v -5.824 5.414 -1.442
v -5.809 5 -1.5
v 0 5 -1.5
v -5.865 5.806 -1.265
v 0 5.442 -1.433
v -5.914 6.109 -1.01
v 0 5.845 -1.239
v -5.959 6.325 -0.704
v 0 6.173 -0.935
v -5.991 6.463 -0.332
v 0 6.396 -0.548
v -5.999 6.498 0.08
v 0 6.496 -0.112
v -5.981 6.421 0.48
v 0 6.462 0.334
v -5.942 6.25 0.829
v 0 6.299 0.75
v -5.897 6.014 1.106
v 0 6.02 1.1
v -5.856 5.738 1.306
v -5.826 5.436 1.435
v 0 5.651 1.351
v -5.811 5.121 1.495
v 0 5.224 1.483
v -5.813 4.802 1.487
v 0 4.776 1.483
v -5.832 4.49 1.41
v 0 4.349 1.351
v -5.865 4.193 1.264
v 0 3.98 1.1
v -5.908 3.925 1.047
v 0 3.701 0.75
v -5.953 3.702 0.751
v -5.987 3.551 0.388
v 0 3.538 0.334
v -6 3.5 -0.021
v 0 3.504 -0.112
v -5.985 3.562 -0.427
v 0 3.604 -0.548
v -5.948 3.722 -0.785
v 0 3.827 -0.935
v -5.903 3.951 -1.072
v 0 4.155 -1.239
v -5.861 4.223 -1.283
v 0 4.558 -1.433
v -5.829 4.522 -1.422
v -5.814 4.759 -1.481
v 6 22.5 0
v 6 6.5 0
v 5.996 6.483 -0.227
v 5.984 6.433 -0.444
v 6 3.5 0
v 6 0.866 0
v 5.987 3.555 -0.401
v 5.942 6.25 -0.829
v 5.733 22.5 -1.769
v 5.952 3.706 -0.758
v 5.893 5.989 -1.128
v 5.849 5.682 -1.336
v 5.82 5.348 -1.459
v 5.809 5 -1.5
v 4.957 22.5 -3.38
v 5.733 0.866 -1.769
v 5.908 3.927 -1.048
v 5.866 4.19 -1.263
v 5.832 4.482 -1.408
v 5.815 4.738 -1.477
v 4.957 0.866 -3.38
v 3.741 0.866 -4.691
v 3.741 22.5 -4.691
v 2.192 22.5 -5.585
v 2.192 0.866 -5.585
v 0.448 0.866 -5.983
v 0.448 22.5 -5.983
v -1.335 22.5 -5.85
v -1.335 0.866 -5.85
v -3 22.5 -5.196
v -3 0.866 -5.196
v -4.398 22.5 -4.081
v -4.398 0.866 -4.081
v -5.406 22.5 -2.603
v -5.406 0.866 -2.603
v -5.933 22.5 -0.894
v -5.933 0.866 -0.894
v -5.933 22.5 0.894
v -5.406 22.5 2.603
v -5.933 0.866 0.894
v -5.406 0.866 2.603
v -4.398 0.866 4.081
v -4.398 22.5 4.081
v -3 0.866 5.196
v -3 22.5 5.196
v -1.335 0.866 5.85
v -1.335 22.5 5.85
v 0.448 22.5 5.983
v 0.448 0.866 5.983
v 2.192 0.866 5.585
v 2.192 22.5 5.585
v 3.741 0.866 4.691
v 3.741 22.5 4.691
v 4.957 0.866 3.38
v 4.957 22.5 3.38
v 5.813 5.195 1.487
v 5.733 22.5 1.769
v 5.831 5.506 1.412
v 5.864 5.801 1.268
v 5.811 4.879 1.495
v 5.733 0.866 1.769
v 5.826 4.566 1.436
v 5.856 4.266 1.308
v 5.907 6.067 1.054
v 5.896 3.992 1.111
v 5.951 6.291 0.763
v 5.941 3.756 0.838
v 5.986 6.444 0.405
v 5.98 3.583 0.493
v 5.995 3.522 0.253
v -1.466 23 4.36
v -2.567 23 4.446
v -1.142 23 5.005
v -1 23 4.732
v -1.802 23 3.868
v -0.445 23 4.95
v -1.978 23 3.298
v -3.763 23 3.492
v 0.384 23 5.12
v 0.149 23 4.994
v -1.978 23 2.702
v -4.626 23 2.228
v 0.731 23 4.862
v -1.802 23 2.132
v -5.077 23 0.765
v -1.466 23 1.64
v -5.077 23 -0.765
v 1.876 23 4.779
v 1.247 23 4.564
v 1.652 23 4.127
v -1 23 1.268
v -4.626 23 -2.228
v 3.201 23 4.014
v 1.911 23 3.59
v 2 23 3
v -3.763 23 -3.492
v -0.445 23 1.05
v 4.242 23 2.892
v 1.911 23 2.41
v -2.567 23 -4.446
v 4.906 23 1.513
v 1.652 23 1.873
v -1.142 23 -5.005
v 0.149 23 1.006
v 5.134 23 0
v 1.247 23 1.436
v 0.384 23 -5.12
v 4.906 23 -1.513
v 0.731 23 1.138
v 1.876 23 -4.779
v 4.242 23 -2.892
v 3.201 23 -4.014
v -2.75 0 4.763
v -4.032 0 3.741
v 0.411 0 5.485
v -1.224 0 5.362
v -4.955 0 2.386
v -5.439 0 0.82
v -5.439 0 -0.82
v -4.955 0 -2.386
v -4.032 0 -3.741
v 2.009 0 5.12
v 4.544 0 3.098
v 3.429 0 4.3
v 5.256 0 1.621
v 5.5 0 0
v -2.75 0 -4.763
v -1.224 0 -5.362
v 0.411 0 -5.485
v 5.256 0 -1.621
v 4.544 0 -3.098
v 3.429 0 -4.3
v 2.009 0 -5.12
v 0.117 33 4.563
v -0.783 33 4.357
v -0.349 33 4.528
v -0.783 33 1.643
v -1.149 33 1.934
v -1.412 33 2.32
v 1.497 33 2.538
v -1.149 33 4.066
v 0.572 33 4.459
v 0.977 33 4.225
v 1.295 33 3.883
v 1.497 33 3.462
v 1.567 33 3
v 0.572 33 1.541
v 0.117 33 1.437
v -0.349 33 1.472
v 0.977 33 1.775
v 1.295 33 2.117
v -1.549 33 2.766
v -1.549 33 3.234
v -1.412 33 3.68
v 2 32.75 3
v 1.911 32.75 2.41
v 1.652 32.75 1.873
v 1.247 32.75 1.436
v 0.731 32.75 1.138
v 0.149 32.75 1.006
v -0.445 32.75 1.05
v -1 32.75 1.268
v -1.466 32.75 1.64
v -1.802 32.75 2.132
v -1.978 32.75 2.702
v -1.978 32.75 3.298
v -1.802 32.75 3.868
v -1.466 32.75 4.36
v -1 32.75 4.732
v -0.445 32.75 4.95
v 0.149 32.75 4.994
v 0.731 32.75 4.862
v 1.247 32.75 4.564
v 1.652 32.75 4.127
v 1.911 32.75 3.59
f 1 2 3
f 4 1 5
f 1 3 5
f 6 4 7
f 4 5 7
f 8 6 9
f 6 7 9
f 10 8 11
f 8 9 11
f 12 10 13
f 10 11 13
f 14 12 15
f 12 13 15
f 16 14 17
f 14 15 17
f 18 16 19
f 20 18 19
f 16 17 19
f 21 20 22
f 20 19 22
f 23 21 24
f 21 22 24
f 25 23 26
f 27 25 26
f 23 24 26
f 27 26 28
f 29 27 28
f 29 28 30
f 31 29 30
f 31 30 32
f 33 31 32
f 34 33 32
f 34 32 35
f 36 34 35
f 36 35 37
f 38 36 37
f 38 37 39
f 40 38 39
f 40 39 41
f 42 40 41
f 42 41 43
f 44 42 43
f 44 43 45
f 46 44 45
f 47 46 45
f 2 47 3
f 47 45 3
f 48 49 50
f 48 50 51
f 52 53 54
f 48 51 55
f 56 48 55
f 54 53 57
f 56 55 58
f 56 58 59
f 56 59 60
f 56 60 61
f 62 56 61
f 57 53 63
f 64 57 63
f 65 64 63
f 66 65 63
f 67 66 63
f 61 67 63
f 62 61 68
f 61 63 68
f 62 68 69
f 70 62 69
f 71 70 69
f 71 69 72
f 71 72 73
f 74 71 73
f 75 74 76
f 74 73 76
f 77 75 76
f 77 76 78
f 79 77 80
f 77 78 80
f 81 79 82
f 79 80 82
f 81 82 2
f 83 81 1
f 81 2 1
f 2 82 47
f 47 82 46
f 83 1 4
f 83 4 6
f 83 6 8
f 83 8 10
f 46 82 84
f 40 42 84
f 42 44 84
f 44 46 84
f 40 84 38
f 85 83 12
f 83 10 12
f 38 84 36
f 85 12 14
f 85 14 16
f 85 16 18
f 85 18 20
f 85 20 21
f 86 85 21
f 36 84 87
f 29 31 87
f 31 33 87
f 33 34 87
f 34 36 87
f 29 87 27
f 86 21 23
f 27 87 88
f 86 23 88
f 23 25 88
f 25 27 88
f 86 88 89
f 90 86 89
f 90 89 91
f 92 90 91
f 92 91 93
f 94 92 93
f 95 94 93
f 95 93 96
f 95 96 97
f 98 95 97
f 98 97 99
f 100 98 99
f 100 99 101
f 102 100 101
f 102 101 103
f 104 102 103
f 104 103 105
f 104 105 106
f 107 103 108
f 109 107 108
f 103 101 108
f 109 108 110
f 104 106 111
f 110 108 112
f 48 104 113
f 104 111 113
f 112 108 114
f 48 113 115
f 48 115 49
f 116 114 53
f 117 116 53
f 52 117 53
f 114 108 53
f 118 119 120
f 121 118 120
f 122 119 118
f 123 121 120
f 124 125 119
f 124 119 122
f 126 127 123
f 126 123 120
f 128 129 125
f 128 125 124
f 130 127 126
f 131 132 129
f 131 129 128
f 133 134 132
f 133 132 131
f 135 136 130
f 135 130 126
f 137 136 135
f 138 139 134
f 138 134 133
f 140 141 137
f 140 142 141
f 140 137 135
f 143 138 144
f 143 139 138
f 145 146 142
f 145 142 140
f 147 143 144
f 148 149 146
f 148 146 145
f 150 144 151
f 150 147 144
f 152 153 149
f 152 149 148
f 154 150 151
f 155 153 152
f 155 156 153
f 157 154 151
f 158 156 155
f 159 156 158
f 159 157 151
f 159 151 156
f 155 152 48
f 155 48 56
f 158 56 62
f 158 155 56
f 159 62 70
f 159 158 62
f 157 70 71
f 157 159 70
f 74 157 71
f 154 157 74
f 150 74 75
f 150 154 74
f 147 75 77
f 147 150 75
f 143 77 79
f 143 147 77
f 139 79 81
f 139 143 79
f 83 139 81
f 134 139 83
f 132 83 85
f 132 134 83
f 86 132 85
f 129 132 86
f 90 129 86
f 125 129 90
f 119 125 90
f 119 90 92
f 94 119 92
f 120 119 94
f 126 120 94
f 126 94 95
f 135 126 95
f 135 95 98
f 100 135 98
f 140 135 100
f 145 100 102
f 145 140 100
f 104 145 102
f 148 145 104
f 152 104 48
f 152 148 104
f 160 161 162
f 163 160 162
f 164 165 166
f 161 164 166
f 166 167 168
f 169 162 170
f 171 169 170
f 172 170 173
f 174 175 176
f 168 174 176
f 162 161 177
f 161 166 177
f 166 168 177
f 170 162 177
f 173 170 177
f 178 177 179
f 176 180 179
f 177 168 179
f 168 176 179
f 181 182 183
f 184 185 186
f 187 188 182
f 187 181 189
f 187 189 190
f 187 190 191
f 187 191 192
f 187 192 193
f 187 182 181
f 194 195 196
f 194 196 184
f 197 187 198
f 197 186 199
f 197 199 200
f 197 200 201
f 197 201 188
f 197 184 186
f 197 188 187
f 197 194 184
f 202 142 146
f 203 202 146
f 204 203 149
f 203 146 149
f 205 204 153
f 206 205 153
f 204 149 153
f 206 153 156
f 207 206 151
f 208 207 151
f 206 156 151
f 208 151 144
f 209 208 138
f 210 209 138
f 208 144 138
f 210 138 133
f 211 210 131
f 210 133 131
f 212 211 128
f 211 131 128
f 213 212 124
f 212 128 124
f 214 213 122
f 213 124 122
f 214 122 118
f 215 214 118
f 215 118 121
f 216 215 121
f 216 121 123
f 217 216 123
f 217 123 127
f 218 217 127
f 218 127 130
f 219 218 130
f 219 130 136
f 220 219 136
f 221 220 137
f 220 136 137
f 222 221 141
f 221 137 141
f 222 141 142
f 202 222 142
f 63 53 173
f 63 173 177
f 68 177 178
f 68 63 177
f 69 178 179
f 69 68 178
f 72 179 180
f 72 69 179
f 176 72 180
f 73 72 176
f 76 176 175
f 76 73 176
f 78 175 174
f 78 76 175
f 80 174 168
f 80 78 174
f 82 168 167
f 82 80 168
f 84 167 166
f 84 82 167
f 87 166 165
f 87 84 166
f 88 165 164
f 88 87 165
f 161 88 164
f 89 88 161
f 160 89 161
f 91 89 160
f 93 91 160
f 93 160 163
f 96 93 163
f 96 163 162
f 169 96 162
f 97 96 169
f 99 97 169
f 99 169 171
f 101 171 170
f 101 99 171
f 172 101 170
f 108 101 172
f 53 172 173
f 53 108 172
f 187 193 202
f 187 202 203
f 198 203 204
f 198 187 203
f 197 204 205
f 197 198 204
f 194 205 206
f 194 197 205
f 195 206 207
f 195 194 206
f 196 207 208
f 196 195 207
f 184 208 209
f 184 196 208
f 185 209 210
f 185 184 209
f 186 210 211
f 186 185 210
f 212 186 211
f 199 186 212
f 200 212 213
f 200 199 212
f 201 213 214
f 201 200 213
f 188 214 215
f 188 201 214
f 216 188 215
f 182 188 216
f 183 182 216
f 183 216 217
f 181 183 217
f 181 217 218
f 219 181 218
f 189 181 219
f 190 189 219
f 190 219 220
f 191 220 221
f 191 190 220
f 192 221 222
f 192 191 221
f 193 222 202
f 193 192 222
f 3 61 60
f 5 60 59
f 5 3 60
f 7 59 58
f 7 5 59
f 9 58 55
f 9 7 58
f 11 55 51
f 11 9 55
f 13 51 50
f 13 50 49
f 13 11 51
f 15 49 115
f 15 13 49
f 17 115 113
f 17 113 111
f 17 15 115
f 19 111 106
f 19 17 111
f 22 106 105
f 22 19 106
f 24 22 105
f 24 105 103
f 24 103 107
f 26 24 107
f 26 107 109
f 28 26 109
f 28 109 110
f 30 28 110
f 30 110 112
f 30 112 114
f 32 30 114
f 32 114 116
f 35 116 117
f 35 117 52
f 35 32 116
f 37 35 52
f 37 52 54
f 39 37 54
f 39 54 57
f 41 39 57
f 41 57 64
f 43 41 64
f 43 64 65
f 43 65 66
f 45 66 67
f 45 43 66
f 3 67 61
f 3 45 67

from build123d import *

# Parameters (mm, degrees)
SKETCH1_R               = 6
BOSS_EXTRUDE1_DEPTH     = 23
SKETCH2_R               = 2
BOSS_EXTRUDE2_DEPTH     = 10
SKETCH3_R               = 1.5
CUT_EXTRUDE1_DEPTH      = 7
CUT_EXTRUDE1_DEPTH_BACK = 7
CHAMFER1_SIZE           = 0.25
CHAMFER1_SIZE2          = 0.433012702
CHAMFER2_SIZE           = 0.5
CHAMFER2_SIZE2          = 0.866025404
CHAMFER2_PART_2_SIZE    = 0.5
CHAMFER2_PART_2_SIZE2   = 0.866025404


with BuildPart() as part:
    # Sketch1 → Boss-Extrude1 (new body)
    with BuildSketch(Plane(origin=(0, 0, 0), x_dir=(1, 0, 0), z_dir=(0, 1, 0))):
        Circle(SKETCH1_R)
    extrude(amount=BOSS_EXTRUDE1_DEPTH)

    # Sketch2 → Boss-Extrude2 (add)
    with BuildSketch(Plane(origin=(0, 23, 0), x_dir=(1, 0, 0), z_dir=(0, 1, 0))):
        with Locations((0, -3)):
            Circle(SKETCH2_R)
    extrude(amount=BOSS_EXTRUDE2_DEPTH)

    # Sketch3 → Cut-Extrude1 (cut, two sides)
    with BuildSketch(Plane(origin=(0, 0, 0), x_dir=(0, 0, -1), z_dir=(1, 0, 0))) as cut_extrude1_sk:
        with Locations((0, 5)):
            Circle(SKETCH3_R)
    extrude(amount=CUT_EXTRUDE1_DEPTH, mode=Mode.SUBTRACT)
    extrude(cut_extrude1_sk.sketch, amount=-CUT_EXTRUDE1_DEPTH_BACK, mode=Mode.SUBTRACT)

    # Chamfer1
    chamfer1_edges = [part.edges().sort_by_distance(p)[0] for p in [
        (-2, 33, 3),
    ]]
    chamfer1_side = [part.faces().sort_by_distance(p)[0] for p in [
        (-2, 28, 3),
    ]]
    chamfer(chamfer1_edges, length=CHAMFER1_SIZE, length2=CHAMFER1_SIZE2, reference=chamfer1_side[0])

    # Chamfer2
    chamfer2_edges = [part.edges().sort_by_distance(p)[0] for p in [
        (-6, 0, 0),
    ]]
    chamfer2_side = [part.faces().sort_by_distance(p)[0] for p in [
        (0, 0, 0),
    ]]
    chamfer(chamfer2_edges, length=CHAMFER2_SIZE, length2=CHAMFER2_SIZE2, reference=chamfer2_side[0])

    # Chamfer2 part 2
    chamfer2_part_2_edges = [part.edges().sort_by_distance(p)[0] for p in [
        (-6, 23, 0),
    ]]
    chamfer2_part_2_side = [part.faces().sort_by_distance(p)[0] for p in [
        (-6, 11.5, 0),
    ]]
    chamfer(chamfer2_part_2_edges, length=CHAMFER2_PART_2_SIZE, length2=CHAMFER2_PART_2_SIZE2, reference=chamfer2_part_2_side[0])


solid = part.part
